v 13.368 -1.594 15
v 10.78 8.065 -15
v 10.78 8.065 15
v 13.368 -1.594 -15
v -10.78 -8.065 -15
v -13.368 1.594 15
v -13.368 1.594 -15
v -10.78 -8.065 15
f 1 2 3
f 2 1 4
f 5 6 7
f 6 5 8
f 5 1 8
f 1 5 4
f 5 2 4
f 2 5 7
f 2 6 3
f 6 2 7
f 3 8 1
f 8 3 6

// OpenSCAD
// Generated by generate_scads.py
union() {
  rotate([30,90,45]) {
    cube(size=[30,10,25], center=true);
  }
}
